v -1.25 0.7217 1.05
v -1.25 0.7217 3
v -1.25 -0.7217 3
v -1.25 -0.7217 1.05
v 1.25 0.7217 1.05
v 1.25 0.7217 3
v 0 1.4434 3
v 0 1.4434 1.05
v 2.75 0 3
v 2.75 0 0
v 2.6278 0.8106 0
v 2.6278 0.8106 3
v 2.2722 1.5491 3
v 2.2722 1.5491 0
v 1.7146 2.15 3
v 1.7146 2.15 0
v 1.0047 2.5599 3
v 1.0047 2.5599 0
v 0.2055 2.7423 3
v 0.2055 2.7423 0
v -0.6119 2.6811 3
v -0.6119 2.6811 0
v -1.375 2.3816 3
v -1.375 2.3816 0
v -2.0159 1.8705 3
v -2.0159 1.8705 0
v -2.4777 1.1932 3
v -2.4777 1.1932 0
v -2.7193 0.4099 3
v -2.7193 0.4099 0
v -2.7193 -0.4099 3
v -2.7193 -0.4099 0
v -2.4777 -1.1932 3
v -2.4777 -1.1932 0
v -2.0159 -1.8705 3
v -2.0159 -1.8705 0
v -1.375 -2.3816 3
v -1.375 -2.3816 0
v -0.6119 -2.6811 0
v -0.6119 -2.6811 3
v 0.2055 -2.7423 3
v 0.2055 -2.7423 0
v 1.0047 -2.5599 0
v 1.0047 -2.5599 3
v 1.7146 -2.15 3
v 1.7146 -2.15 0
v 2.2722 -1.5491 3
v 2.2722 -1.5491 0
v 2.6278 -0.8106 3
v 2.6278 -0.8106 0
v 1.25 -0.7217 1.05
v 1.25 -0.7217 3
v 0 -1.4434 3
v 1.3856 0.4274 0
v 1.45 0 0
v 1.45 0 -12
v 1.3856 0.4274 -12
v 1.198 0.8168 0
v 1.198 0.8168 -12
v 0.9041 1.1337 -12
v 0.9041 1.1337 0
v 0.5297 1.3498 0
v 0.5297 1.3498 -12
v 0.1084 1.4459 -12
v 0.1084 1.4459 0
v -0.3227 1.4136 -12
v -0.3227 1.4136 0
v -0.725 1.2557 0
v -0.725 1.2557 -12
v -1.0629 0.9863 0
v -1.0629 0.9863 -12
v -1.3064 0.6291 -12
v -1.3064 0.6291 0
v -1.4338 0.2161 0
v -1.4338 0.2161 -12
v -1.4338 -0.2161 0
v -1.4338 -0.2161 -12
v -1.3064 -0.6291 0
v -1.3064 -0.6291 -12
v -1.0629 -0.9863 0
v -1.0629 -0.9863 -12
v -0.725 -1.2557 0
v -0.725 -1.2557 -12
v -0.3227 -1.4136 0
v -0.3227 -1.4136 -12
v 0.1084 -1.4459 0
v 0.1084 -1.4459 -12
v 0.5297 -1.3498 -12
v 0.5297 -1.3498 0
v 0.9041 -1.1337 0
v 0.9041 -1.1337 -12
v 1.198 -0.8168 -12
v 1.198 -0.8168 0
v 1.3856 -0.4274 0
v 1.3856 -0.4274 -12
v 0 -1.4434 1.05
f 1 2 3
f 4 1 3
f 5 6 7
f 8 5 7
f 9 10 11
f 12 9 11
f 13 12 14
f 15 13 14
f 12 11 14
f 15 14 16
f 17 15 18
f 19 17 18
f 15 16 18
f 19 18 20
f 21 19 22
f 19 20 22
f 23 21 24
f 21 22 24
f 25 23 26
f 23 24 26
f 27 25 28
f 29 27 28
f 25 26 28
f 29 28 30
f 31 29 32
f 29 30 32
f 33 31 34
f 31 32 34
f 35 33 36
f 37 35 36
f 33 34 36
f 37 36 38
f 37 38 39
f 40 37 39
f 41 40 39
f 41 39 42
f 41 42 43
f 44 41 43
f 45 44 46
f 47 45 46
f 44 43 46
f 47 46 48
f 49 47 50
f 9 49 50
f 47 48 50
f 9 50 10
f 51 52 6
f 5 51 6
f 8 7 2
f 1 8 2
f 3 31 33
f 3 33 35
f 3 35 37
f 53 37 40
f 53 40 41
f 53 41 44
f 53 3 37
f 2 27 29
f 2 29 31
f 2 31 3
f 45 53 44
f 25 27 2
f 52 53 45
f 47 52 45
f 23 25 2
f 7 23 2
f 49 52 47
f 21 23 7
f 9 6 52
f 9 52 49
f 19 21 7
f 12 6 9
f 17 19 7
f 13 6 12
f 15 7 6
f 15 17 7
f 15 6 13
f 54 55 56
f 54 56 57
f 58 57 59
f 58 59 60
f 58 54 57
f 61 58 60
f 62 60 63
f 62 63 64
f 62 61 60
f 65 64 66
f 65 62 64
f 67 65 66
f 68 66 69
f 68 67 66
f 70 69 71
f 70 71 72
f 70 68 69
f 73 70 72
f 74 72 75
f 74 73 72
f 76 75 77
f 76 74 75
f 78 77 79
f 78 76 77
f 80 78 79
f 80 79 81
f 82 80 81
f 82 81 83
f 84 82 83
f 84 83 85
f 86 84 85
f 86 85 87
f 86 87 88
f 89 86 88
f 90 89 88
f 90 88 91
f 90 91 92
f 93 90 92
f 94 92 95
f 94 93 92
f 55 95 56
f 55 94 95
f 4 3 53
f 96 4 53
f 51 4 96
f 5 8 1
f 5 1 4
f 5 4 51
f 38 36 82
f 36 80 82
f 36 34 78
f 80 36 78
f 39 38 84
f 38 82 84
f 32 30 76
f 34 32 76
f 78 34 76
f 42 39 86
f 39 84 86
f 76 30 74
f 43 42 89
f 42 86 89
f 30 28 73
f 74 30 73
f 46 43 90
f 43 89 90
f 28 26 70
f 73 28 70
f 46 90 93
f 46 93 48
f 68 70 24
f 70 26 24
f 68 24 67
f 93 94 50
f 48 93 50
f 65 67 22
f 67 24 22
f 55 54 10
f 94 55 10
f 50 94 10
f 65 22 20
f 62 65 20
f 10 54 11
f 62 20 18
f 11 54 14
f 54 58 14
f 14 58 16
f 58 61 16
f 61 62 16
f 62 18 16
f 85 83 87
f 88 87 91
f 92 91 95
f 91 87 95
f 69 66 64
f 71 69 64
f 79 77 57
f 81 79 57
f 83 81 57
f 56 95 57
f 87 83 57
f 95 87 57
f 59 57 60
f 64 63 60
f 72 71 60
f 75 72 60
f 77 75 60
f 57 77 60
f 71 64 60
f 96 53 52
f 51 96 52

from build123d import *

# Parameters (mm, degrees)
SKETCH_1_R                     = 1.45
SHANK_THREADS_SIMPLIFIED_DEPTH = 12
SKETCH_2_R                     = 2.75
HEAD_DEPTH                     = 3
HEX_SOCKET_DEPTH               = 1.95


with BuildPart() as part:
    # 草图1 → Shank_threads_simplified (new body)
    with BuildSketch(Plane.XY):
        Circle(SKETCH_1_R)
    extrude(amount=-SHANK_THREADS_SIMPLIFIED_DEPTH)

    # 草图2 → Head (add)
    with BuildSketch(Plane.XY):
        Circle(SKETCH_2_R)
    extrude(amount=HEAD_DEPTH)

    # 草图3 → Hex_socket (cut)
    with BuildSketch(Plane.XY.offset(3)):
        Polygon((1.25, 0.721687836), (0, 1.443375673), (-1.25, 0.721687836), (-1.25, -0.721687836), (0, -1.443375673), (1.25, -0.721687836), align=None)
    extrude(amount=-HEX_SOCKET_DEPTH, mode=Mode.SUBTRACT)


solid = part.part
